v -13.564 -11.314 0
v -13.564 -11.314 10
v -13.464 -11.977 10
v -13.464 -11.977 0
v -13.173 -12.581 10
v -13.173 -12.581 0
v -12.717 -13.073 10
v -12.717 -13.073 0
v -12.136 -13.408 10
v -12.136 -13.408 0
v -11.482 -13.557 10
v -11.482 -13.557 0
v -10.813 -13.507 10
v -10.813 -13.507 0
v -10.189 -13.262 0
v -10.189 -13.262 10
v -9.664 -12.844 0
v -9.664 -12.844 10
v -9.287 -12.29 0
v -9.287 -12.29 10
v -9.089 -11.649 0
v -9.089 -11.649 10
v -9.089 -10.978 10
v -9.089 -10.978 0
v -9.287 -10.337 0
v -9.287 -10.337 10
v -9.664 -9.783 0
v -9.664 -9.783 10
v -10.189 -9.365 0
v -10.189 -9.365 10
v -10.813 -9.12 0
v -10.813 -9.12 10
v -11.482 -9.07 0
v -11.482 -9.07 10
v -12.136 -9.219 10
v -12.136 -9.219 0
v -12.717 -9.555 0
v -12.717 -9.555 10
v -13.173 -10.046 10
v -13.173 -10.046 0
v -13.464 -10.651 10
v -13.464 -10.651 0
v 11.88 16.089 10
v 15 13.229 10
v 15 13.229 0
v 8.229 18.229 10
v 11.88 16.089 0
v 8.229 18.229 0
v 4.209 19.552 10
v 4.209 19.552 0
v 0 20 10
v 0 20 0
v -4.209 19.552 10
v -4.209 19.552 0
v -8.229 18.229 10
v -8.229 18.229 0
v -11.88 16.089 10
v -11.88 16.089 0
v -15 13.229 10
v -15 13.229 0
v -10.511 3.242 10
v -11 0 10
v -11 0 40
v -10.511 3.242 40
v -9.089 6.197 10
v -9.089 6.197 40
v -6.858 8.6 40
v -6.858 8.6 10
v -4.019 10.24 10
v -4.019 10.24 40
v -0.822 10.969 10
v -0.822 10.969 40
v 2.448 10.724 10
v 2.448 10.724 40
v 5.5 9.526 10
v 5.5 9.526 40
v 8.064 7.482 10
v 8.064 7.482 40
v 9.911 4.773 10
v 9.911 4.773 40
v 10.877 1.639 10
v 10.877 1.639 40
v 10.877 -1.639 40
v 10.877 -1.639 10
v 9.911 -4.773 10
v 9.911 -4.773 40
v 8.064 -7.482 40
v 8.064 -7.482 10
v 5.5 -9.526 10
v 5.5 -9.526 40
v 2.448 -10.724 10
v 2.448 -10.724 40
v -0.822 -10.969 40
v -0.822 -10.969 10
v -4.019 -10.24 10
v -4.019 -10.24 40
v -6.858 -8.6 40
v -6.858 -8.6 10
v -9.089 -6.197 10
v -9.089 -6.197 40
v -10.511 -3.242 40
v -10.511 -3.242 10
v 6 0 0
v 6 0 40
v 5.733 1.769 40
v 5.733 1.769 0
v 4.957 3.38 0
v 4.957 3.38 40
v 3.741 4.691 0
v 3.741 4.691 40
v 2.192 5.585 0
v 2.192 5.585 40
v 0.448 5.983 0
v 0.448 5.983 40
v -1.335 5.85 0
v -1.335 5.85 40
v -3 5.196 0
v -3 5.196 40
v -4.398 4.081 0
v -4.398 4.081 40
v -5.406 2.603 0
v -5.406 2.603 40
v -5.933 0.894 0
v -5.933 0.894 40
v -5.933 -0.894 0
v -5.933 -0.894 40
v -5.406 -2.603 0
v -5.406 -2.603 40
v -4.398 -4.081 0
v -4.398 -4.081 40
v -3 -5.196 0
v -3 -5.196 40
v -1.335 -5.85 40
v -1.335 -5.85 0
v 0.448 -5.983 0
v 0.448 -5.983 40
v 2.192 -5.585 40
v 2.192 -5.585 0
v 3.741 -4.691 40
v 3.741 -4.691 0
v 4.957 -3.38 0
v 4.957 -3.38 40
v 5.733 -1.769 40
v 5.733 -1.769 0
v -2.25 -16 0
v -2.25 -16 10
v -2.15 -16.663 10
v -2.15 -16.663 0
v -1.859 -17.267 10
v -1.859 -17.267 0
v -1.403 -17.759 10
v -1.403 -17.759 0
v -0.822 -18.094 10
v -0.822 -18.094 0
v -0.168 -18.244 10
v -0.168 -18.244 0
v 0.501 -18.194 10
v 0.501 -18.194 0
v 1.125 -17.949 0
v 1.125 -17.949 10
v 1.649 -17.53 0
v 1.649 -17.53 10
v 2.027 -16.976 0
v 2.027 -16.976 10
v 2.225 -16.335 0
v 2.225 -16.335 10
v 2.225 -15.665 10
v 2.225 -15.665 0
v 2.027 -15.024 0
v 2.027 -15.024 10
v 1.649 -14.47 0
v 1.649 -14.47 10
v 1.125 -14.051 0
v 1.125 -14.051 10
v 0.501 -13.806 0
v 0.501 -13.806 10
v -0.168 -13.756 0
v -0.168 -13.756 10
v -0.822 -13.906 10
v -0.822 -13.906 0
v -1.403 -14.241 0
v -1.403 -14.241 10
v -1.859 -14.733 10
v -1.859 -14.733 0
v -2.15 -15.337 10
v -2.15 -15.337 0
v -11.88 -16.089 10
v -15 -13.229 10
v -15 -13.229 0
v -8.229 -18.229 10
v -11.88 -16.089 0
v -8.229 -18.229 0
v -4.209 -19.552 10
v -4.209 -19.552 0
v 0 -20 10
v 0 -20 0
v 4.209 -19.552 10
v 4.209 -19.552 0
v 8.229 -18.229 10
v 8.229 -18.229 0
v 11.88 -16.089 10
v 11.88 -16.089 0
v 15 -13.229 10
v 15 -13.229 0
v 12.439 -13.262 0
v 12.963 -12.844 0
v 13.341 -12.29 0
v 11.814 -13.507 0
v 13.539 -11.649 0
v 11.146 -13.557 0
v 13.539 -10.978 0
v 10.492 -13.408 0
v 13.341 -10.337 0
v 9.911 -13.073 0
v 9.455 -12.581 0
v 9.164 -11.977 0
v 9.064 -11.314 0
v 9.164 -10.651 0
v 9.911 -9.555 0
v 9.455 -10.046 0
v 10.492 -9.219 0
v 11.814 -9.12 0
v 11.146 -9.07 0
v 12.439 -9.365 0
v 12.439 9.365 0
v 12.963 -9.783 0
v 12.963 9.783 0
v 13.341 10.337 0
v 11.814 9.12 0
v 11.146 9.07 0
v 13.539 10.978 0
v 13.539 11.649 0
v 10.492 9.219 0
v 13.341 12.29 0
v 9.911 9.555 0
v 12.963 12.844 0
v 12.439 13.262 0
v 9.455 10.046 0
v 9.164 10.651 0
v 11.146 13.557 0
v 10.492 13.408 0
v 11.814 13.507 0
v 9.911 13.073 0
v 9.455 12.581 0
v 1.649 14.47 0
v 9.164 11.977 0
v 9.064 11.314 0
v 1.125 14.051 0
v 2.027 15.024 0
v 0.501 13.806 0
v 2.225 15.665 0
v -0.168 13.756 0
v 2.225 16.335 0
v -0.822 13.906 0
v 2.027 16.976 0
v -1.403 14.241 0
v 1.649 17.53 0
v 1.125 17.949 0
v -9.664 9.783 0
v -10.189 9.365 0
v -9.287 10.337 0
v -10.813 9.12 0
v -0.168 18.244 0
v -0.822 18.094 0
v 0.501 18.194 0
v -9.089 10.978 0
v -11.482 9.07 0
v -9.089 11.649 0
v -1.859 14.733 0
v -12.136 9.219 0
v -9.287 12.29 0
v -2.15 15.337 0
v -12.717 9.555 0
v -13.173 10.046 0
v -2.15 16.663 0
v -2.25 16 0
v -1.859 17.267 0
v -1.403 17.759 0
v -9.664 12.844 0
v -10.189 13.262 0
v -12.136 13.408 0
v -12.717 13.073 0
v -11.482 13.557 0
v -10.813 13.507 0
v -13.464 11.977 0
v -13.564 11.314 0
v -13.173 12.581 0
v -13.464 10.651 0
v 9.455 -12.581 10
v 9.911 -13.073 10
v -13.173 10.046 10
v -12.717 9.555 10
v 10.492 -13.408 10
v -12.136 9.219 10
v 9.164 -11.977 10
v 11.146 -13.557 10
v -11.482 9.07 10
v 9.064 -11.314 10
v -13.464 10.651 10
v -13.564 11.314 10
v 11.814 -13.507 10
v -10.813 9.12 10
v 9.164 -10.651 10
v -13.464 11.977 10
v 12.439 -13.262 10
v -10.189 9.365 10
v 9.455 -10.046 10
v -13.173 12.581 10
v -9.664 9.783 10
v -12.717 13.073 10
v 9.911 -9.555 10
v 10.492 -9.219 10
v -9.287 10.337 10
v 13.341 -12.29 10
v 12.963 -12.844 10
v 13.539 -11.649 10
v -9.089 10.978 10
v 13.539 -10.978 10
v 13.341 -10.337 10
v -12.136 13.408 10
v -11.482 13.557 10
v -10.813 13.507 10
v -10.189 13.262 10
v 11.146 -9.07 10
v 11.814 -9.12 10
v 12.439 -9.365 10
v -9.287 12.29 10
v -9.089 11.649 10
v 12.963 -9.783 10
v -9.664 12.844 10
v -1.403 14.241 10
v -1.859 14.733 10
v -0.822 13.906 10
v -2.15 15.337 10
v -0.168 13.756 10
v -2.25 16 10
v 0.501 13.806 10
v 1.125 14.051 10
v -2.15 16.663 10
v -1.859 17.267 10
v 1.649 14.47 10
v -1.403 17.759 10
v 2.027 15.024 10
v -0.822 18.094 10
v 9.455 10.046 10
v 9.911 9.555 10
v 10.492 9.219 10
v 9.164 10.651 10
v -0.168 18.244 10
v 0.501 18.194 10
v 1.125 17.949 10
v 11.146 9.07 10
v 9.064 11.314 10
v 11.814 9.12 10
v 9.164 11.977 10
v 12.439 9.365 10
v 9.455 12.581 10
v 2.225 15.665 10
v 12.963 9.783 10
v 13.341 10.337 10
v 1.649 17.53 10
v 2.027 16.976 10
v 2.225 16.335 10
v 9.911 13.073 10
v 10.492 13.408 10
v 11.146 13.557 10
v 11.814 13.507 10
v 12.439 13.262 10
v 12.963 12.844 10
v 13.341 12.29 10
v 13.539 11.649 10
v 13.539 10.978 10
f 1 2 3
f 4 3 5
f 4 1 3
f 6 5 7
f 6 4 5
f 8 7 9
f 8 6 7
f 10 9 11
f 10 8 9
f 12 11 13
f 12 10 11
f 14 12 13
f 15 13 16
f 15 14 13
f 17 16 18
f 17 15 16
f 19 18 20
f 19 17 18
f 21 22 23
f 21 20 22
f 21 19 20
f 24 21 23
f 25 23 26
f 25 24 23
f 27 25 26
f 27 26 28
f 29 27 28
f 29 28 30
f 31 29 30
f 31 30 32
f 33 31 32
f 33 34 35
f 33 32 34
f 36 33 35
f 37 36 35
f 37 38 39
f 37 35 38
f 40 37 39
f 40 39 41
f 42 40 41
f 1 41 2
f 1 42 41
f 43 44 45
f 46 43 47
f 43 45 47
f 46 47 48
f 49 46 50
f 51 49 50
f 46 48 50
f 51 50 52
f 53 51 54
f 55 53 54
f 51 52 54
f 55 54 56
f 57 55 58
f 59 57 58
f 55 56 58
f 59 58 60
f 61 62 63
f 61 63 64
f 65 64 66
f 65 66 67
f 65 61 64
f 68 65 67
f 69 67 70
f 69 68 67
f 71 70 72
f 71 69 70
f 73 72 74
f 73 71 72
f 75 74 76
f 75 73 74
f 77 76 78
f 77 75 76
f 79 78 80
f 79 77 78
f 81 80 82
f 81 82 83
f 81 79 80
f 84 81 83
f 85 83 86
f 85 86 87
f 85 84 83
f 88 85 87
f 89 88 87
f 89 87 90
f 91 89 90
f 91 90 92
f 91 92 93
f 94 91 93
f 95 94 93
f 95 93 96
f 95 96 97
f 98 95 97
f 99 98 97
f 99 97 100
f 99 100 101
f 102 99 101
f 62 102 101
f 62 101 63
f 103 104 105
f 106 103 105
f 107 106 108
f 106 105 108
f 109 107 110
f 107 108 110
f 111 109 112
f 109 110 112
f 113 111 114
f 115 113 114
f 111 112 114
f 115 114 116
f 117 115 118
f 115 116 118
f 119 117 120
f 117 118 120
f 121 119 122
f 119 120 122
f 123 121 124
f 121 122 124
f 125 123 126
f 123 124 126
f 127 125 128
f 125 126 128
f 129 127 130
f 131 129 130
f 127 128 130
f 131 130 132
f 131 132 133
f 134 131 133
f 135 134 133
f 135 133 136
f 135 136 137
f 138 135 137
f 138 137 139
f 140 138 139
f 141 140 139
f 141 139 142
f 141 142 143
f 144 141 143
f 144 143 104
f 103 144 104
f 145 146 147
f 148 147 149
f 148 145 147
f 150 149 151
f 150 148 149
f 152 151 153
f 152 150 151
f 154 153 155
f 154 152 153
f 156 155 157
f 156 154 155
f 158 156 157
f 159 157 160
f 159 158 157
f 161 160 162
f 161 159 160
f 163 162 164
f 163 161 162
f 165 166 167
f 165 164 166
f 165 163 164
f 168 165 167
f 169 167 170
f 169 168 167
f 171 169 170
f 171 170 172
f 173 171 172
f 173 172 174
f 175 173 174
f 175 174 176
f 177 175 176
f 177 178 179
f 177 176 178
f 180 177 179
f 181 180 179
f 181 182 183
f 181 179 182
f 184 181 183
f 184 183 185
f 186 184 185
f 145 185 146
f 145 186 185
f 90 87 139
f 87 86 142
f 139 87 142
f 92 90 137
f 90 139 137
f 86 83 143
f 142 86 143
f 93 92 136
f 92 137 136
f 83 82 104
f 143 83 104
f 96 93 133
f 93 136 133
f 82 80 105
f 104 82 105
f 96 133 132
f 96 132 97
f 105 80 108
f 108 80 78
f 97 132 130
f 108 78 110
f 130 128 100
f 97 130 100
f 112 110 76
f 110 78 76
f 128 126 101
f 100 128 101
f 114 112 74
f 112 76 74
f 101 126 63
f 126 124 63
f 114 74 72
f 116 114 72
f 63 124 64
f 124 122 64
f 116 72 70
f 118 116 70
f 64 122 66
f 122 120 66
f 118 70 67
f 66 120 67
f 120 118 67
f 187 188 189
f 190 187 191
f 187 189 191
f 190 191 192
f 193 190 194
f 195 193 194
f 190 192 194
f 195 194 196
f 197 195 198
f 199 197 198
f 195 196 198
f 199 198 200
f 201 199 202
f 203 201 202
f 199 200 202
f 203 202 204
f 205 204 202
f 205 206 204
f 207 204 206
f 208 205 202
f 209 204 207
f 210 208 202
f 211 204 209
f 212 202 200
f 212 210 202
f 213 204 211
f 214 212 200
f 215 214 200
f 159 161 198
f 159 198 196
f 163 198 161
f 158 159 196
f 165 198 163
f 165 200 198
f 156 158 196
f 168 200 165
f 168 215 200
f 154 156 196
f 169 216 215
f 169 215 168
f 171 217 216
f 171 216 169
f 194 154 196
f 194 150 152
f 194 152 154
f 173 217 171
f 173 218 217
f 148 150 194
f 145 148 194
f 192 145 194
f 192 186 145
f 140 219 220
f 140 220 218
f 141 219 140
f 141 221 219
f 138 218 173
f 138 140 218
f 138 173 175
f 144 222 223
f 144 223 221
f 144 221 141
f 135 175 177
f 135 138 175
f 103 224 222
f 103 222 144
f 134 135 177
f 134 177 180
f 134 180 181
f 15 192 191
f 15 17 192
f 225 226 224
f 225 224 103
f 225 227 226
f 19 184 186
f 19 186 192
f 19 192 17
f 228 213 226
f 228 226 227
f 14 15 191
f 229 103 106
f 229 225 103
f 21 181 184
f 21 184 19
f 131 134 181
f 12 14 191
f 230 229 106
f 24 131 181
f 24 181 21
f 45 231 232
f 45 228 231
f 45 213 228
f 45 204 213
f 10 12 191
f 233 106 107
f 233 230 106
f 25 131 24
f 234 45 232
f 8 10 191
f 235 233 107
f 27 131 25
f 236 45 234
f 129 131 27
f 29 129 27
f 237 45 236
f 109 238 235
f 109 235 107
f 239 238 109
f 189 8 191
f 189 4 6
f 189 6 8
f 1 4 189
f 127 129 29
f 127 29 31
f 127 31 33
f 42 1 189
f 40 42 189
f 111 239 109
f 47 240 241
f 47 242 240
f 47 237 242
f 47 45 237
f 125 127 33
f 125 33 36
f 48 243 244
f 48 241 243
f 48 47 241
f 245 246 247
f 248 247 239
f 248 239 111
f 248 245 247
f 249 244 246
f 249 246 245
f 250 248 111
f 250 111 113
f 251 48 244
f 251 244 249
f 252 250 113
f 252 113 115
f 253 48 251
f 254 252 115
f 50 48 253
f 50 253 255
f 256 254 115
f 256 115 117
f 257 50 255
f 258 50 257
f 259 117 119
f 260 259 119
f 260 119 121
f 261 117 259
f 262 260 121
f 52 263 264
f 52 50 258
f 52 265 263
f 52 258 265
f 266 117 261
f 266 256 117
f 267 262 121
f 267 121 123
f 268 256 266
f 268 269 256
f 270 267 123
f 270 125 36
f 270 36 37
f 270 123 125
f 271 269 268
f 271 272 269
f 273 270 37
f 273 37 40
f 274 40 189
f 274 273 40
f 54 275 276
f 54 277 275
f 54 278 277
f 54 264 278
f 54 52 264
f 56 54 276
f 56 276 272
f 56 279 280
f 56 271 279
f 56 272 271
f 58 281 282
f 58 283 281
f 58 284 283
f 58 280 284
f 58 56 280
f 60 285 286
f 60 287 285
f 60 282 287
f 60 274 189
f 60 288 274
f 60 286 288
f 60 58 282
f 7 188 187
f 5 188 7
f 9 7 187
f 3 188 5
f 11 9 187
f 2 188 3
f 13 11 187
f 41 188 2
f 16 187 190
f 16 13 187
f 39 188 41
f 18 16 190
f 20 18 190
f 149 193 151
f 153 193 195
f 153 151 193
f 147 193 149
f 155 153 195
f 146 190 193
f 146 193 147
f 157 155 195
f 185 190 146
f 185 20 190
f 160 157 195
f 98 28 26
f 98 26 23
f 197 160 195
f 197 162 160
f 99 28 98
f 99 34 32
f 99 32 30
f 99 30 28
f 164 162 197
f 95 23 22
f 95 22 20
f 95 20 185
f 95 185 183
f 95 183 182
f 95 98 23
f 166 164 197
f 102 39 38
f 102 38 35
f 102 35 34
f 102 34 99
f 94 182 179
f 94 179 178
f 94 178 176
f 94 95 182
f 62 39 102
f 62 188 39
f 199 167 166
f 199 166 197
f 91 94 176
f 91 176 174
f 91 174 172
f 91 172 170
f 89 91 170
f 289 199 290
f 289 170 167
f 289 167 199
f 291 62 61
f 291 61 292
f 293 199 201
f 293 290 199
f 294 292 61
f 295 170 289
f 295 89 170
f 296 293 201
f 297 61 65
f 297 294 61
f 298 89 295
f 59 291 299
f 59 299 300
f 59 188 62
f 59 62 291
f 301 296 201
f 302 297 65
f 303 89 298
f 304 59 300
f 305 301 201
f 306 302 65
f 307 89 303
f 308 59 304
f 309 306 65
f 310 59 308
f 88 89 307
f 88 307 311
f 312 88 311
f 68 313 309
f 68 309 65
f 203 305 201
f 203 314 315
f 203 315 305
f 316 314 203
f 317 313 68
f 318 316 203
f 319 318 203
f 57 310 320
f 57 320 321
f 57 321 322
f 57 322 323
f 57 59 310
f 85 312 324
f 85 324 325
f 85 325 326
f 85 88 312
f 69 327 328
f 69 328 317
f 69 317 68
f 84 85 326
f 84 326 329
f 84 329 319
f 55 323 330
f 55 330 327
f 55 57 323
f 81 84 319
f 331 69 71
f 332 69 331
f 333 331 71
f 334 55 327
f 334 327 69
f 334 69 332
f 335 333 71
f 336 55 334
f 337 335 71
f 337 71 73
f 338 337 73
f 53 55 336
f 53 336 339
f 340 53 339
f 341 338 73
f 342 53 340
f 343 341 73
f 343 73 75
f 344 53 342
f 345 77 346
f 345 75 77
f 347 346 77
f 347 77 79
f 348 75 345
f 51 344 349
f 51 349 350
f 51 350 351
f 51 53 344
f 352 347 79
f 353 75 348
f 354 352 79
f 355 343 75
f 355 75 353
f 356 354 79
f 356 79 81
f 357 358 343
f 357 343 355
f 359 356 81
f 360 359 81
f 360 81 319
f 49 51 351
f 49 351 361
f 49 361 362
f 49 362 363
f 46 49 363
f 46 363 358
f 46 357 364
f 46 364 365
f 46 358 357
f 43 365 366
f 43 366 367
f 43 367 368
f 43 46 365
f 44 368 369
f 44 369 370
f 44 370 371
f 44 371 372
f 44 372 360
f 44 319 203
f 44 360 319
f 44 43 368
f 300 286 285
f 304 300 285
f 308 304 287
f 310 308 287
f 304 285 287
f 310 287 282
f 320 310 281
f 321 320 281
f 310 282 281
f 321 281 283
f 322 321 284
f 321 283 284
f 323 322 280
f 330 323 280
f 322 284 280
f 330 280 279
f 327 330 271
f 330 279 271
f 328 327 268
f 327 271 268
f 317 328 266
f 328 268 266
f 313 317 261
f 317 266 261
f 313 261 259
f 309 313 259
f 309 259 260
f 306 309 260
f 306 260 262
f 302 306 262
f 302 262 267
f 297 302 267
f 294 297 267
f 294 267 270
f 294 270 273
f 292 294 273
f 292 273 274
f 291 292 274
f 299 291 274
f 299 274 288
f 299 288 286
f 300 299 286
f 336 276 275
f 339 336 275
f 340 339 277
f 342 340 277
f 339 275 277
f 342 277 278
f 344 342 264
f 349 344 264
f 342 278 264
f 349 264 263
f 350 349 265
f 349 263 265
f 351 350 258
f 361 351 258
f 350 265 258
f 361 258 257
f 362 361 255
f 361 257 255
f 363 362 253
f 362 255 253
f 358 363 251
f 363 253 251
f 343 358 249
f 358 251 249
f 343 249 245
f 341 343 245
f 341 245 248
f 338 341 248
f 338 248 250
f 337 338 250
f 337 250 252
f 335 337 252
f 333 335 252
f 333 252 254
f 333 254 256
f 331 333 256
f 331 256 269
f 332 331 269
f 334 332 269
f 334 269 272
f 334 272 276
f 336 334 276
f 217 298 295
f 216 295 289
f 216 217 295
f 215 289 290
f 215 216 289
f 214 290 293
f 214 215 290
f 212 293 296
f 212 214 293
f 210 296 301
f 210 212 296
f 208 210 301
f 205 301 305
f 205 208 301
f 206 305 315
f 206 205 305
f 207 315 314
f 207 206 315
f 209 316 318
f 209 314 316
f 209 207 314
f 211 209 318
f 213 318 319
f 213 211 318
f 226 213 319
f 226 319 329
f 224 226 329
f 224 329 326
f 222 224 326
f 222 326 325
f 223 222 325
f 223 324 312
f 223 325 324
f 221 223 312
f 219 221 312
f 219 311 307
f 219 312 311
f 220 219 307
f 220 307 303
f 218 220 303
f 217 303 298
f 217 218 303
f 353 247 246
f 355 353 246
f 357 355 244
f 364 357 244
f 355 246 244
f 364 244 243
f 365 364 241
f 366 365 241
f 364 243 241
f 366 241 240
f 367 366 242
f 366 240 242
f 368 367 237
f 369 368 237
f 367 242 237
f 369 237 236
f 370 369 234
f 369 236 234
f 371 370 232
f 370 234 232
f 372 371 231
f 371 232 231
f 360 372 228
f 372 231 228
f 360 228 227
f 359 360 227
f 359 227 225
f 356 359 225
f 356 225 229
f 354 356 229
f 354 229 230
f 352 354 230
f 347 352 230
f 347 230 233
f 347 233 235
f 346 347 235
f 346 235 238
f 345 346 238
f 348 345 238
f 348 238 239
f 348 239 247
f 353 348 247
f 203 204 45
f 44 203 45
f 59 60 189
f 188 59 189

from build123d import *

# Parameters (mm, degrees)
BOSS_EXTRUDE1_DEPTH = 10
SKETCH2_R           = 11
BOSS_EXTRUDE2_DEPTH = 40
SKETCH3_R           = 6
CUT_EXTRUDE1_DEPTH  = 48.16990566
SKETCH4_R           = 2.25
CUT_EXTRUDE2_DEPTH  = 48.16990566


with BuildPart() as part:
    # Sketch1 → Boss-Extrude1 (new body)
    with BuildSketch(Plane.XY):
        with BuildLine():
            Line((-15, 13.228756555), (-15, -13.228756555))
            ThreePointArc((-15, -13.228756555), (0, -20), (15, -13.228756555))
            Line((15, -13.228756555), (15, 13.228756555))
            ThreePointArc((15, 13.228756555), (0, 20), (-15, 13.228756555))
        make_face()
    extrude(amount=BOSS_EXTRUDE1_DEPTH)

    # Sketch2 → Boss-Extrude2 (add)
    with BuildSketch(Plane(origin=(0, 0, 0), x_dir=(-1, 0, 0), z_dir=(0, 0, -1))):
        Circle(SKETCH2_R)
    extrude(amount=-BOSS_EXTRUDE2_DEPTH)

    # Sketch3 → Cut-Extrude1 (cut, through all)
    with BuildSketch(Plane.XY.offset(40)):
        Circle(SKETCH3_R)
    extrude(amount=-CUT_EXTRUDE1_DEPTH, mode=Mode.SUBTRACT)

    # Sketch4 → Cut-Extrude2 (cut, through all)
    with BuildSketch(Plane(origin=(0, 0, 0), x_dir=(-1, 0, 0), z_dir=(0, 0, -1))):
        with Locations((-11.313708499, 11.313708499)):
            Circle(SKETCH4_R)
        with Locations((0, 16)):
            Circle(SKETCH4_R)
        with Locations((11.313708499, 11.313708499)):
            Circle(SKETCH4_R)
    cut_extrude2 = extrude(amount=-CUT_EXTRUDE2_DEPTH, mode=Mode.SUBTRACT)

    # Mirror1: Cut-Extrude2 across plane
    add(cut_extrude2.mirror(Plane.ZX), mode=Mode.SUBTRACT)


solid = part.part
